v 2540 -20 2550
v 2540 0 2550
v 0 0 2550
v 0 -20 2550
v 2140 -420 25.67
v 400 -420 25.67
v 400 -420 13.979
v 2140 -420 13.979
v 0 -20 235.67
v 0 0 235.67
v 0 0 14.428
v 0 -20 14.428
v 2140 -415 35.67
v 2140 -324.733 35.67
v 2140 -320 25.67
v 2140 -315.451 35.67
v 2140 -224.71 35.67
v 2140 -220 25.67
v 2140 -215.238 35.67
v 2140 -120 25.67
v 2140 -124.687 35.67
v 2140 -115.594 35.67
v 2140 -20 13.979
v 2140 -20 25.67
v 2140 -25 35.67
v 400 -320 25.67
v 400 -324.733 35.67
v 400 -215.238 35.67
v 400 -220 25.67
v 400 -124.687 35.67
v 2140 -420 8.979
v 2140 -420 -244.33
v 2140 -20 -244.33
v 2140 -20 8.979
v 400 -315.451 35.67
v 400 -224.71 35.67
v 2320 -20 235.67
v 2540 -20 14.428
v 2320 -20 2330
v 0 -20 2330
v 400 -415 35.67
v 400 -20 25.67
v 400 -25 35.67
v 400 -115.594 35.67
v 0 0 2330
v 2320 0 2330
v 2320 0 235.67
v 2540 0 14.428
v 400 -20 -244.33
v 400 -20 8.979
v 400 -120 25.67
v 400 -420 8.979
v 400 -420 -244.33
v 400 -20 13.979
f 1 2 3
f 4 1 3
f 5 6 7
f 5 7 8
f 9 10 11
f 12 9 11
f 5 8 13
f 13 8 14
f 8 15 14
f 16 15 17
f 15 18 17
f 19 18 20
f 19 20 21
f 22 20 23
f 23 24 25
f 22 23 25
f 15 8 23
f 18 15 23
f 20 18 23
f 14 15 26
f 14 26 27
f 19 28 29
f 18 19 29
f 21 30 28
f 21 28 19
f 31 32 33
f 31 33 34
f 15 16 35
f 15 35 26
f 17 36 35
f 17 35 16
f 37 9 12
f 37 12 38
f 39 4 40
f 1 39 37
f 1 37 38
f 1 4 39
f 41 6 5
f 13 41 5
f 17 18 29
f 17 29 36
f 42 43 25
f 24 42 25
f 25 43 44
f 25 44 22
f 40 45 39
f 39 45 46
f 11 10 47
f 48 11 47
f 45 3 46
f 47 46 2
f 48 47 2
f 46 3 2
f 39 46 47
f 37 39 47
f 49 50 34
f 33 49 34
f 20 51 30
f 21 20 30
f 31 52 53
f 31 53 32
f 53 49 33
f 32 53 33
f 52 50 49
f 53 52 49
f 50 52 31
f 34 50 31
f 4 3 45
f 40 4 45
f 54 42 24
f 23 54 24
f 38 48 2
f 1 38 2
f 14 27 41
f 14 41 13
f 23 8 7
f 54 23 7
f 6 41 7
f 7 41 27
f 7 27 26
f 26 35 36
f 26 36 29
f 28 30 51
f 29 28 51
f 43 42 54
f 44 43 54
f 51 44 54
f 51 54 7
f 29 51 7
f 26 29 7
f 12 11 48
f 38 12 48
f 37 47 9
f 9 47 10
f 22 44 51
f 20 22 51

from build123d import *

# Parameters (mm, degrees)
F1_DEPTH = 20
F2_W     = 1740
F2_H     = 21.2428141385
F2_H_2   = 258.7571858615
F3_DEPTH = 400
F5_DEPTH = 1740
F6_SIZE2 = 10
F6_SIZE  = 5
F7_SIZE2 = 5
F7_SIZE  = 10
F9_DEPTH = 400


with BuildPart() as f1:
    # F0 (on Front) → F1 (new body)
    with BuildSketch(Plane.XZ):
        Polygon((2540, 2550), (0, 2550), (0, 2330), (2320, 2330), (2320, 235.6703919172), (0, 235.6703919172), (0, 14.4275780767), (2540, 14.4275780767), align=None)
    extrude(amount=F1_DEPTH)


with BuildPart() as f3:
    # F2 (on face) → F3 (new body)
    with BuildSketch(Plane.XZ.offset(20)):
        with Locations((1270, 25.048985146)):
            Rectangle(F2_W, F2_H)
        with Locations((1270, -114.951014854)):
            Rectangle(F2_W, F2_H_2)
    extrude(amount=F3_DEPTH)

    # F4 (on face) → F5 (cut, through all)
    with BuildSketch(Plane(origin=(400, 0, 0), x_dir=(0, -1, 0), z_dir=(-1, 0, 0))):
        Polygon((324.7329890728, 35.6703922153), (315.450578928, 35.6703922153), (320, 25.6703922153), align=None)
        Polygon((224.7101962566, 35.6703922153), (220, 35.6703922153), (215.2383476496, 35.6703922153), (220, 25.6703922153), align=None)
        Polygon((120, 25.6703922153), (124.6874108911, 35.6703922153), (115.5944317579, 35.6703922153), align=None)
    extrude(amount=-F5_DEPTH, mode=Mode.SUBTRACT)

    # F6
    f6_edges = [f3.edges().sort_by_distance(p)[0] for p in [
        (1270, -420, 35.670392),
    ]]
    f6_side = f3.faces().sort_by_distance((1270, -372.366495, 35.670392))[0]
    chamfer(f6_edges, length=F6_SIZE, length2=F6_SIZE2, reference=f6_side)

    # F7
    f7_edges = [f3.edges().sort_by_distance(p)[0] for p in [
        (1270, -20, 35.670392),
    ]]
    f7_side = f3.faces().sort_by_distance((1270, -20, -104.329608))[0]
    chamfer(f7_edges, length=F7_SIZE, length2=F7_SIZE2, reference=f7_side)

    # F8 (on face) → F9 (cut, through all)
    with BuildSketch(Plane.XZ.offset(420)):
        Polygon((410, 13.9794712886), (400, 13.9794712886), (400, 8.9794712886), (410, 8.9794712886), (2130, 8.9794712886), (2140, 8.9794712886), (2140, 13.9794712886), (2130, 13.9794712886), align=None)
    extrude(amount=-F9_DEPTH, mode=Mode.SUBTRACT)


solid = Compound([f1.part, f3.part])
